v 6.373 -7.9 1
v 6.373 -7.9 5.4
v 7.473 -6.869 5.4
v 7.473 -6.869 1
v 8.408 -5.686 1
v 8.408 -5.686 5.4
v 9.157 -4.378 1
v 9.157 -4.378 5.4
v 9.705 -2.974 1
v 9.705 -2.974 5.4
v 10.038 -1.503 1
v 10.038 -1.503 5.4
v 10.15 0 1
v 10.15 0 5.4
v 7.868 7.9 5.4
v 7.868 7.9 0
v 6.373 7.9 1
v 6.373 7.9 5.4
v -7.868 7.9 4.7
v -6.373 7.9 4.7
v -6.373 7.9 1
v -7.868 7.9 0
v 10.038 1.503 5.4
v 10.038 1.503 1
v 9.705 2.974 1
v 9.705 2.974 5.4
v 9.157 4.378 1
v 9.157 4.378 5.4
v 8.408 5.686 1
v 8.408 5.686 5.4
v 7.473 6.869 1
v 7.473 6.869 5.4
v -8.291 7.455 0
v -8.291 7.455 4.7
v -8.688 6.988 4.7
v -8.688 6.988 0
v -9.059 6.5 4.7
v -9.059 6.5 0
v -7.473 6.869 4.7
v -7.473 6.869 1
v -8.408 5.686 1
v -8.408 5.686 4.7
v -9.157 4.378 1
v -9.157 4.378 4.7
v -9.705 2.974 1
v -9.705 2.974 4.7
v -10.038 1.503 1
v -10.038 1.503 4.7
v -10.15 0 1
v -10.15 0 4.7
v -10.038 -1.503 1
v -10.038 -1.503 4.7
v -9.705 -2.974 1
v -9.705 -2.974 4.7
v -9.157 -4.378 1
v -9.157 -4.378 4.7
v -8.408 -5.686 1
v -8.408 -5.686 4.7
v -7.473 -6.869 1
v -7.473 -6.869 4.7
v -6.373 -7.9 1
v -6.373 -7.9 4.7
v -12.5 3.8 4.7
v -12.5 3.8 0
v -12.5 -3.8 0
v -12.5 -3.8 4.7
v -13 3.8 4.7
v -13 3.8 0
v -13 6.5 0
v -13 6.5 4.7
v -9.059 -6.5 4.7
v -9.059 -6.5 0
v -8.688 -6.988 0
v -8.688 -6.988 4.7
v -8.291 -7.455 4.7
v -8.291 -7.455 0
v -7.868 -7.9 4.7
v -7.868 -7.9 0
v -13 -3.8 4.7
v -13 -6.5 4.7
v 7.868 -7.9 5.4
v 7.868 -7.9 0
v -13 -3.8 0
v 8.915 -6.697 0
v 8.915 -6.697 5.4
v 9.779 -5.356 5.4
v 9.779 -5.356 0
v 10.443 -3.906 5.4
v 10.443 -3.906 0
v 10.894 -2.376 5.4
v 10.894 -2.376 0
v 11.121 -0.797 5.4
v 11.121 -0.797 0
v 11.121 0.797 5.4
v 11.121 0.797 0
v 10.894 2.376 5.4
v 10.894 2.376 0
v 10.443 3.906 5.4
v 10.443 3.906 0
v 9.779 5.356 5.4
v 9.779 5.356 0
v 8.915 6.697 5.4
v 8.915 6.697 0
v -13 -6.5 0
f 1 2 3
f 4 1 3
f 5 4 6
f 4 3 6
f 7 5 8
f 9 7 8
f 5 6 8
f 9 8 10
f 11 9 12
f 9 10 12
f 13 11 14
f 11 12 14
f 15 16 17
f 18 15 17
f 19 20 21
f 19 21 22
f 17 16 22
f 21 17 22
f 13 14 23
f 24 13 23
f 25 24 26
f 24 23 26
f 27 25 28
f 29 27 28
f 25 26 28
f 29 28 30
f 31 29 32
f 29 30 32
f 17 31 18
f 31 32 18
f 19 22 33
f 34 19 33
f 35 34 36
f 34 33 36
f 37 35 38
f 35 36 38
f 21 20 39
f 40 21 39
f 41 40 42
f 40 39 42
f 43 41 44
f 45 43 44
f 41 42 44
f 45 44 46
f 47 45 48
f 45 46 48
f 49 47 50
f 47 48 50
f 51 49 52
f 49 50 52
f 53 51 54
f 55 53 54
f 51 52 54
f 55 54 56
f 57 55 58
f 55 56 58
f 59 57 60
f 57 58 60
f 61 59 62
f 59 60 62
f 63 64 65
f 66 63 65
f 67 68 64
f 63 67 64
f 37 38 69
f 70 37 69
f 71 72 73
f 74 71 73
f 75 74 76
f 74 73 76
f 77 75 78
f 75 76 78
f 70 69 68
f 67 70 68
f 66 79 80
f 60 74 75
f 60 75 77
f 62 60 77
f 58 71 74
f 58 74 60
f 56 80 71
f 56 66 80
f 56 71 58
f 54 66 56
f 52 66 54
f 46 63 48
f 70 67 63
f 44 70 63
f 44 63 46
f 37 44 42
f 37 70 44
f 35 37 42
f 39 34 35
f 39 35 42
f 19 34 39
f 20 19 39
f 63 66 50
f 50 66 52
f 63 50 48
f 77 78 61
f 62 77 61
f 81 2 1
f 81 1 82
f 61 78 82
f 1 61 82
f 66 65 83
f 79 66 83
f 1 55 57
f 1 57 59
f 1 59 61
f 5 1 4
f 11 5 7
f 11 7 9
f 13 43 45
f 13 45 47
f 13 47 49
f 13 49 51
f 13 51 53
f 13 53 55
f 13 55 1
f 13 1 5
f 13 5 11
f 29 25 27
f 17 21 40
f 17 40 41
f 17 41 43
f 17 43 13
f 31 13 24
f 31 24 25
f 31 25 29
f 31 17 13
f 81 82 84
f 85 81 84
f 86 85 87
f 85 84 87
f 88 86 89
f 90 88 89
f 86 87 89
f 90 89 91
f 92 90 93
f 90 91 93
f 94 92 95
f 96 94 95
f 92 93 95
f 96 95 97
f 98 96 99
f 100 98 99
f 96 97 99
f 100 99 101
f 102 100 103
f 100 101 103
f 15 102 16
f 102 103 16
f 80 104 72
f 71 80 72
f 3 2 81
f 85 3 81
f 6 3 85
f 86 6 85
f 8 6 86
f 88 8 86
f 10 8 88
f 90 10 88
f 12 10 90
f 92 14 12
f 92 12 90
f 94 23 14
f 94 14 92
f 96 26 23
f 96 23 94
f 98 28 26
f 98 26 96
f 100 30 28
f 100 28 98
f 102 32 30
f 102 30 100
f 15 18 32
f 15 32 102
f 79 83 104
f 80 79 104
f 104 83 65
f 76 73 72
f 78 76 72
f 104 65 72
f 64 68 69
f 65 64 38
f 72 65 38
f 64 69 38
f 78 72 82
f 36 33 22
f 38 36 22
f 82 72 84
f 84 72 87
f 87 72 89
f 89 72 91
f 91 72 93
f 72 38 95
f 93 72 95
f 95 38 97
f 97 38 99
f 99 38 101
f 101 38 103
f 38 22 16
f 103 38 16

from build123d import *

# Parameters (mm, degrees)
F1_DEPTH = 5.4
F3_DEPTH = 4.4
F4_DEPTH = 0.7


with BuildPart() as f1:
    # F0 (on Top) → F1 (new body)
    with BuildSketch(Plane.XY):
        with BuildLine():
            Line((-13, -6.5), (-9.0593873965, -6.5))
            ThreePointArc((-9.0593873965, -6.5), (-8.4928156006, -7.2245818685), (-7.8684496567, -7.9))
            Line((-7.8684496567, -7.9), (7.8684496567, -7.9))
            ThreePointArc((7.8684496567, -7.9), (11.15, 0), (7.8684496567, 7.9))
            Line((7.8684496567, 7.9), (-7.8684496567, 7.9))
            ThreePointArc((-7.8684496567, 7.9), (-8.4928156006, 7.2245818685), (-9.0593873965, 6.5))
            Line((-9.0593873965, 6.5), (-13, 6.5))
            Line((-13, 6.5), (-13, 3.8))
            Line((-13, 3.8), (-12.5, 3.8))
            Line((-12.5, 3.8), (-12.5, -3.8))
            Line((-12.5, -3.8), (-13, -3.8))
            Line((-13, -3.8), (-13, -6.5))
        make_face()
    extrude(amount=F1_DEPTH)

    # F2 (on face) → F3 (cut)
    with BuildSketch(Plane.XY.offset(5.4)):
        with BuildLine():
            ThreePointArc((6.3727937359, -7.9), (9.1571381015, -4.3782784049), (10.15, 0))
            ThreePointArc((10.15, 0), (9.1571381015, 4.3782784049), (6.3727937359, 7.9))
            Line((6.3727937359, 7.9), (-6.3727937359, 7.9))
            ThreePointArc((-6.3727937359, 7.9), (-10.15, 0), (-6.3727937359, -7.9))
            Line((-6.3727937359, -7.9), (6.3727937359, -7.9))
        make_face()
    extrude(amount=-F3_DEPTH, mode=Mode.SUBTRACT)

    # F4 (cut): a face of the model
    f4_faces = [f1.faces().sort_by_distance(p)[0] for p in [
        (-10.7326109912, 0, 5.4),
    ]]
    extrude(f4_faces, amount=-F4_DEPTH, mode=Mode.SUBTRACT)


solid = f1.part
